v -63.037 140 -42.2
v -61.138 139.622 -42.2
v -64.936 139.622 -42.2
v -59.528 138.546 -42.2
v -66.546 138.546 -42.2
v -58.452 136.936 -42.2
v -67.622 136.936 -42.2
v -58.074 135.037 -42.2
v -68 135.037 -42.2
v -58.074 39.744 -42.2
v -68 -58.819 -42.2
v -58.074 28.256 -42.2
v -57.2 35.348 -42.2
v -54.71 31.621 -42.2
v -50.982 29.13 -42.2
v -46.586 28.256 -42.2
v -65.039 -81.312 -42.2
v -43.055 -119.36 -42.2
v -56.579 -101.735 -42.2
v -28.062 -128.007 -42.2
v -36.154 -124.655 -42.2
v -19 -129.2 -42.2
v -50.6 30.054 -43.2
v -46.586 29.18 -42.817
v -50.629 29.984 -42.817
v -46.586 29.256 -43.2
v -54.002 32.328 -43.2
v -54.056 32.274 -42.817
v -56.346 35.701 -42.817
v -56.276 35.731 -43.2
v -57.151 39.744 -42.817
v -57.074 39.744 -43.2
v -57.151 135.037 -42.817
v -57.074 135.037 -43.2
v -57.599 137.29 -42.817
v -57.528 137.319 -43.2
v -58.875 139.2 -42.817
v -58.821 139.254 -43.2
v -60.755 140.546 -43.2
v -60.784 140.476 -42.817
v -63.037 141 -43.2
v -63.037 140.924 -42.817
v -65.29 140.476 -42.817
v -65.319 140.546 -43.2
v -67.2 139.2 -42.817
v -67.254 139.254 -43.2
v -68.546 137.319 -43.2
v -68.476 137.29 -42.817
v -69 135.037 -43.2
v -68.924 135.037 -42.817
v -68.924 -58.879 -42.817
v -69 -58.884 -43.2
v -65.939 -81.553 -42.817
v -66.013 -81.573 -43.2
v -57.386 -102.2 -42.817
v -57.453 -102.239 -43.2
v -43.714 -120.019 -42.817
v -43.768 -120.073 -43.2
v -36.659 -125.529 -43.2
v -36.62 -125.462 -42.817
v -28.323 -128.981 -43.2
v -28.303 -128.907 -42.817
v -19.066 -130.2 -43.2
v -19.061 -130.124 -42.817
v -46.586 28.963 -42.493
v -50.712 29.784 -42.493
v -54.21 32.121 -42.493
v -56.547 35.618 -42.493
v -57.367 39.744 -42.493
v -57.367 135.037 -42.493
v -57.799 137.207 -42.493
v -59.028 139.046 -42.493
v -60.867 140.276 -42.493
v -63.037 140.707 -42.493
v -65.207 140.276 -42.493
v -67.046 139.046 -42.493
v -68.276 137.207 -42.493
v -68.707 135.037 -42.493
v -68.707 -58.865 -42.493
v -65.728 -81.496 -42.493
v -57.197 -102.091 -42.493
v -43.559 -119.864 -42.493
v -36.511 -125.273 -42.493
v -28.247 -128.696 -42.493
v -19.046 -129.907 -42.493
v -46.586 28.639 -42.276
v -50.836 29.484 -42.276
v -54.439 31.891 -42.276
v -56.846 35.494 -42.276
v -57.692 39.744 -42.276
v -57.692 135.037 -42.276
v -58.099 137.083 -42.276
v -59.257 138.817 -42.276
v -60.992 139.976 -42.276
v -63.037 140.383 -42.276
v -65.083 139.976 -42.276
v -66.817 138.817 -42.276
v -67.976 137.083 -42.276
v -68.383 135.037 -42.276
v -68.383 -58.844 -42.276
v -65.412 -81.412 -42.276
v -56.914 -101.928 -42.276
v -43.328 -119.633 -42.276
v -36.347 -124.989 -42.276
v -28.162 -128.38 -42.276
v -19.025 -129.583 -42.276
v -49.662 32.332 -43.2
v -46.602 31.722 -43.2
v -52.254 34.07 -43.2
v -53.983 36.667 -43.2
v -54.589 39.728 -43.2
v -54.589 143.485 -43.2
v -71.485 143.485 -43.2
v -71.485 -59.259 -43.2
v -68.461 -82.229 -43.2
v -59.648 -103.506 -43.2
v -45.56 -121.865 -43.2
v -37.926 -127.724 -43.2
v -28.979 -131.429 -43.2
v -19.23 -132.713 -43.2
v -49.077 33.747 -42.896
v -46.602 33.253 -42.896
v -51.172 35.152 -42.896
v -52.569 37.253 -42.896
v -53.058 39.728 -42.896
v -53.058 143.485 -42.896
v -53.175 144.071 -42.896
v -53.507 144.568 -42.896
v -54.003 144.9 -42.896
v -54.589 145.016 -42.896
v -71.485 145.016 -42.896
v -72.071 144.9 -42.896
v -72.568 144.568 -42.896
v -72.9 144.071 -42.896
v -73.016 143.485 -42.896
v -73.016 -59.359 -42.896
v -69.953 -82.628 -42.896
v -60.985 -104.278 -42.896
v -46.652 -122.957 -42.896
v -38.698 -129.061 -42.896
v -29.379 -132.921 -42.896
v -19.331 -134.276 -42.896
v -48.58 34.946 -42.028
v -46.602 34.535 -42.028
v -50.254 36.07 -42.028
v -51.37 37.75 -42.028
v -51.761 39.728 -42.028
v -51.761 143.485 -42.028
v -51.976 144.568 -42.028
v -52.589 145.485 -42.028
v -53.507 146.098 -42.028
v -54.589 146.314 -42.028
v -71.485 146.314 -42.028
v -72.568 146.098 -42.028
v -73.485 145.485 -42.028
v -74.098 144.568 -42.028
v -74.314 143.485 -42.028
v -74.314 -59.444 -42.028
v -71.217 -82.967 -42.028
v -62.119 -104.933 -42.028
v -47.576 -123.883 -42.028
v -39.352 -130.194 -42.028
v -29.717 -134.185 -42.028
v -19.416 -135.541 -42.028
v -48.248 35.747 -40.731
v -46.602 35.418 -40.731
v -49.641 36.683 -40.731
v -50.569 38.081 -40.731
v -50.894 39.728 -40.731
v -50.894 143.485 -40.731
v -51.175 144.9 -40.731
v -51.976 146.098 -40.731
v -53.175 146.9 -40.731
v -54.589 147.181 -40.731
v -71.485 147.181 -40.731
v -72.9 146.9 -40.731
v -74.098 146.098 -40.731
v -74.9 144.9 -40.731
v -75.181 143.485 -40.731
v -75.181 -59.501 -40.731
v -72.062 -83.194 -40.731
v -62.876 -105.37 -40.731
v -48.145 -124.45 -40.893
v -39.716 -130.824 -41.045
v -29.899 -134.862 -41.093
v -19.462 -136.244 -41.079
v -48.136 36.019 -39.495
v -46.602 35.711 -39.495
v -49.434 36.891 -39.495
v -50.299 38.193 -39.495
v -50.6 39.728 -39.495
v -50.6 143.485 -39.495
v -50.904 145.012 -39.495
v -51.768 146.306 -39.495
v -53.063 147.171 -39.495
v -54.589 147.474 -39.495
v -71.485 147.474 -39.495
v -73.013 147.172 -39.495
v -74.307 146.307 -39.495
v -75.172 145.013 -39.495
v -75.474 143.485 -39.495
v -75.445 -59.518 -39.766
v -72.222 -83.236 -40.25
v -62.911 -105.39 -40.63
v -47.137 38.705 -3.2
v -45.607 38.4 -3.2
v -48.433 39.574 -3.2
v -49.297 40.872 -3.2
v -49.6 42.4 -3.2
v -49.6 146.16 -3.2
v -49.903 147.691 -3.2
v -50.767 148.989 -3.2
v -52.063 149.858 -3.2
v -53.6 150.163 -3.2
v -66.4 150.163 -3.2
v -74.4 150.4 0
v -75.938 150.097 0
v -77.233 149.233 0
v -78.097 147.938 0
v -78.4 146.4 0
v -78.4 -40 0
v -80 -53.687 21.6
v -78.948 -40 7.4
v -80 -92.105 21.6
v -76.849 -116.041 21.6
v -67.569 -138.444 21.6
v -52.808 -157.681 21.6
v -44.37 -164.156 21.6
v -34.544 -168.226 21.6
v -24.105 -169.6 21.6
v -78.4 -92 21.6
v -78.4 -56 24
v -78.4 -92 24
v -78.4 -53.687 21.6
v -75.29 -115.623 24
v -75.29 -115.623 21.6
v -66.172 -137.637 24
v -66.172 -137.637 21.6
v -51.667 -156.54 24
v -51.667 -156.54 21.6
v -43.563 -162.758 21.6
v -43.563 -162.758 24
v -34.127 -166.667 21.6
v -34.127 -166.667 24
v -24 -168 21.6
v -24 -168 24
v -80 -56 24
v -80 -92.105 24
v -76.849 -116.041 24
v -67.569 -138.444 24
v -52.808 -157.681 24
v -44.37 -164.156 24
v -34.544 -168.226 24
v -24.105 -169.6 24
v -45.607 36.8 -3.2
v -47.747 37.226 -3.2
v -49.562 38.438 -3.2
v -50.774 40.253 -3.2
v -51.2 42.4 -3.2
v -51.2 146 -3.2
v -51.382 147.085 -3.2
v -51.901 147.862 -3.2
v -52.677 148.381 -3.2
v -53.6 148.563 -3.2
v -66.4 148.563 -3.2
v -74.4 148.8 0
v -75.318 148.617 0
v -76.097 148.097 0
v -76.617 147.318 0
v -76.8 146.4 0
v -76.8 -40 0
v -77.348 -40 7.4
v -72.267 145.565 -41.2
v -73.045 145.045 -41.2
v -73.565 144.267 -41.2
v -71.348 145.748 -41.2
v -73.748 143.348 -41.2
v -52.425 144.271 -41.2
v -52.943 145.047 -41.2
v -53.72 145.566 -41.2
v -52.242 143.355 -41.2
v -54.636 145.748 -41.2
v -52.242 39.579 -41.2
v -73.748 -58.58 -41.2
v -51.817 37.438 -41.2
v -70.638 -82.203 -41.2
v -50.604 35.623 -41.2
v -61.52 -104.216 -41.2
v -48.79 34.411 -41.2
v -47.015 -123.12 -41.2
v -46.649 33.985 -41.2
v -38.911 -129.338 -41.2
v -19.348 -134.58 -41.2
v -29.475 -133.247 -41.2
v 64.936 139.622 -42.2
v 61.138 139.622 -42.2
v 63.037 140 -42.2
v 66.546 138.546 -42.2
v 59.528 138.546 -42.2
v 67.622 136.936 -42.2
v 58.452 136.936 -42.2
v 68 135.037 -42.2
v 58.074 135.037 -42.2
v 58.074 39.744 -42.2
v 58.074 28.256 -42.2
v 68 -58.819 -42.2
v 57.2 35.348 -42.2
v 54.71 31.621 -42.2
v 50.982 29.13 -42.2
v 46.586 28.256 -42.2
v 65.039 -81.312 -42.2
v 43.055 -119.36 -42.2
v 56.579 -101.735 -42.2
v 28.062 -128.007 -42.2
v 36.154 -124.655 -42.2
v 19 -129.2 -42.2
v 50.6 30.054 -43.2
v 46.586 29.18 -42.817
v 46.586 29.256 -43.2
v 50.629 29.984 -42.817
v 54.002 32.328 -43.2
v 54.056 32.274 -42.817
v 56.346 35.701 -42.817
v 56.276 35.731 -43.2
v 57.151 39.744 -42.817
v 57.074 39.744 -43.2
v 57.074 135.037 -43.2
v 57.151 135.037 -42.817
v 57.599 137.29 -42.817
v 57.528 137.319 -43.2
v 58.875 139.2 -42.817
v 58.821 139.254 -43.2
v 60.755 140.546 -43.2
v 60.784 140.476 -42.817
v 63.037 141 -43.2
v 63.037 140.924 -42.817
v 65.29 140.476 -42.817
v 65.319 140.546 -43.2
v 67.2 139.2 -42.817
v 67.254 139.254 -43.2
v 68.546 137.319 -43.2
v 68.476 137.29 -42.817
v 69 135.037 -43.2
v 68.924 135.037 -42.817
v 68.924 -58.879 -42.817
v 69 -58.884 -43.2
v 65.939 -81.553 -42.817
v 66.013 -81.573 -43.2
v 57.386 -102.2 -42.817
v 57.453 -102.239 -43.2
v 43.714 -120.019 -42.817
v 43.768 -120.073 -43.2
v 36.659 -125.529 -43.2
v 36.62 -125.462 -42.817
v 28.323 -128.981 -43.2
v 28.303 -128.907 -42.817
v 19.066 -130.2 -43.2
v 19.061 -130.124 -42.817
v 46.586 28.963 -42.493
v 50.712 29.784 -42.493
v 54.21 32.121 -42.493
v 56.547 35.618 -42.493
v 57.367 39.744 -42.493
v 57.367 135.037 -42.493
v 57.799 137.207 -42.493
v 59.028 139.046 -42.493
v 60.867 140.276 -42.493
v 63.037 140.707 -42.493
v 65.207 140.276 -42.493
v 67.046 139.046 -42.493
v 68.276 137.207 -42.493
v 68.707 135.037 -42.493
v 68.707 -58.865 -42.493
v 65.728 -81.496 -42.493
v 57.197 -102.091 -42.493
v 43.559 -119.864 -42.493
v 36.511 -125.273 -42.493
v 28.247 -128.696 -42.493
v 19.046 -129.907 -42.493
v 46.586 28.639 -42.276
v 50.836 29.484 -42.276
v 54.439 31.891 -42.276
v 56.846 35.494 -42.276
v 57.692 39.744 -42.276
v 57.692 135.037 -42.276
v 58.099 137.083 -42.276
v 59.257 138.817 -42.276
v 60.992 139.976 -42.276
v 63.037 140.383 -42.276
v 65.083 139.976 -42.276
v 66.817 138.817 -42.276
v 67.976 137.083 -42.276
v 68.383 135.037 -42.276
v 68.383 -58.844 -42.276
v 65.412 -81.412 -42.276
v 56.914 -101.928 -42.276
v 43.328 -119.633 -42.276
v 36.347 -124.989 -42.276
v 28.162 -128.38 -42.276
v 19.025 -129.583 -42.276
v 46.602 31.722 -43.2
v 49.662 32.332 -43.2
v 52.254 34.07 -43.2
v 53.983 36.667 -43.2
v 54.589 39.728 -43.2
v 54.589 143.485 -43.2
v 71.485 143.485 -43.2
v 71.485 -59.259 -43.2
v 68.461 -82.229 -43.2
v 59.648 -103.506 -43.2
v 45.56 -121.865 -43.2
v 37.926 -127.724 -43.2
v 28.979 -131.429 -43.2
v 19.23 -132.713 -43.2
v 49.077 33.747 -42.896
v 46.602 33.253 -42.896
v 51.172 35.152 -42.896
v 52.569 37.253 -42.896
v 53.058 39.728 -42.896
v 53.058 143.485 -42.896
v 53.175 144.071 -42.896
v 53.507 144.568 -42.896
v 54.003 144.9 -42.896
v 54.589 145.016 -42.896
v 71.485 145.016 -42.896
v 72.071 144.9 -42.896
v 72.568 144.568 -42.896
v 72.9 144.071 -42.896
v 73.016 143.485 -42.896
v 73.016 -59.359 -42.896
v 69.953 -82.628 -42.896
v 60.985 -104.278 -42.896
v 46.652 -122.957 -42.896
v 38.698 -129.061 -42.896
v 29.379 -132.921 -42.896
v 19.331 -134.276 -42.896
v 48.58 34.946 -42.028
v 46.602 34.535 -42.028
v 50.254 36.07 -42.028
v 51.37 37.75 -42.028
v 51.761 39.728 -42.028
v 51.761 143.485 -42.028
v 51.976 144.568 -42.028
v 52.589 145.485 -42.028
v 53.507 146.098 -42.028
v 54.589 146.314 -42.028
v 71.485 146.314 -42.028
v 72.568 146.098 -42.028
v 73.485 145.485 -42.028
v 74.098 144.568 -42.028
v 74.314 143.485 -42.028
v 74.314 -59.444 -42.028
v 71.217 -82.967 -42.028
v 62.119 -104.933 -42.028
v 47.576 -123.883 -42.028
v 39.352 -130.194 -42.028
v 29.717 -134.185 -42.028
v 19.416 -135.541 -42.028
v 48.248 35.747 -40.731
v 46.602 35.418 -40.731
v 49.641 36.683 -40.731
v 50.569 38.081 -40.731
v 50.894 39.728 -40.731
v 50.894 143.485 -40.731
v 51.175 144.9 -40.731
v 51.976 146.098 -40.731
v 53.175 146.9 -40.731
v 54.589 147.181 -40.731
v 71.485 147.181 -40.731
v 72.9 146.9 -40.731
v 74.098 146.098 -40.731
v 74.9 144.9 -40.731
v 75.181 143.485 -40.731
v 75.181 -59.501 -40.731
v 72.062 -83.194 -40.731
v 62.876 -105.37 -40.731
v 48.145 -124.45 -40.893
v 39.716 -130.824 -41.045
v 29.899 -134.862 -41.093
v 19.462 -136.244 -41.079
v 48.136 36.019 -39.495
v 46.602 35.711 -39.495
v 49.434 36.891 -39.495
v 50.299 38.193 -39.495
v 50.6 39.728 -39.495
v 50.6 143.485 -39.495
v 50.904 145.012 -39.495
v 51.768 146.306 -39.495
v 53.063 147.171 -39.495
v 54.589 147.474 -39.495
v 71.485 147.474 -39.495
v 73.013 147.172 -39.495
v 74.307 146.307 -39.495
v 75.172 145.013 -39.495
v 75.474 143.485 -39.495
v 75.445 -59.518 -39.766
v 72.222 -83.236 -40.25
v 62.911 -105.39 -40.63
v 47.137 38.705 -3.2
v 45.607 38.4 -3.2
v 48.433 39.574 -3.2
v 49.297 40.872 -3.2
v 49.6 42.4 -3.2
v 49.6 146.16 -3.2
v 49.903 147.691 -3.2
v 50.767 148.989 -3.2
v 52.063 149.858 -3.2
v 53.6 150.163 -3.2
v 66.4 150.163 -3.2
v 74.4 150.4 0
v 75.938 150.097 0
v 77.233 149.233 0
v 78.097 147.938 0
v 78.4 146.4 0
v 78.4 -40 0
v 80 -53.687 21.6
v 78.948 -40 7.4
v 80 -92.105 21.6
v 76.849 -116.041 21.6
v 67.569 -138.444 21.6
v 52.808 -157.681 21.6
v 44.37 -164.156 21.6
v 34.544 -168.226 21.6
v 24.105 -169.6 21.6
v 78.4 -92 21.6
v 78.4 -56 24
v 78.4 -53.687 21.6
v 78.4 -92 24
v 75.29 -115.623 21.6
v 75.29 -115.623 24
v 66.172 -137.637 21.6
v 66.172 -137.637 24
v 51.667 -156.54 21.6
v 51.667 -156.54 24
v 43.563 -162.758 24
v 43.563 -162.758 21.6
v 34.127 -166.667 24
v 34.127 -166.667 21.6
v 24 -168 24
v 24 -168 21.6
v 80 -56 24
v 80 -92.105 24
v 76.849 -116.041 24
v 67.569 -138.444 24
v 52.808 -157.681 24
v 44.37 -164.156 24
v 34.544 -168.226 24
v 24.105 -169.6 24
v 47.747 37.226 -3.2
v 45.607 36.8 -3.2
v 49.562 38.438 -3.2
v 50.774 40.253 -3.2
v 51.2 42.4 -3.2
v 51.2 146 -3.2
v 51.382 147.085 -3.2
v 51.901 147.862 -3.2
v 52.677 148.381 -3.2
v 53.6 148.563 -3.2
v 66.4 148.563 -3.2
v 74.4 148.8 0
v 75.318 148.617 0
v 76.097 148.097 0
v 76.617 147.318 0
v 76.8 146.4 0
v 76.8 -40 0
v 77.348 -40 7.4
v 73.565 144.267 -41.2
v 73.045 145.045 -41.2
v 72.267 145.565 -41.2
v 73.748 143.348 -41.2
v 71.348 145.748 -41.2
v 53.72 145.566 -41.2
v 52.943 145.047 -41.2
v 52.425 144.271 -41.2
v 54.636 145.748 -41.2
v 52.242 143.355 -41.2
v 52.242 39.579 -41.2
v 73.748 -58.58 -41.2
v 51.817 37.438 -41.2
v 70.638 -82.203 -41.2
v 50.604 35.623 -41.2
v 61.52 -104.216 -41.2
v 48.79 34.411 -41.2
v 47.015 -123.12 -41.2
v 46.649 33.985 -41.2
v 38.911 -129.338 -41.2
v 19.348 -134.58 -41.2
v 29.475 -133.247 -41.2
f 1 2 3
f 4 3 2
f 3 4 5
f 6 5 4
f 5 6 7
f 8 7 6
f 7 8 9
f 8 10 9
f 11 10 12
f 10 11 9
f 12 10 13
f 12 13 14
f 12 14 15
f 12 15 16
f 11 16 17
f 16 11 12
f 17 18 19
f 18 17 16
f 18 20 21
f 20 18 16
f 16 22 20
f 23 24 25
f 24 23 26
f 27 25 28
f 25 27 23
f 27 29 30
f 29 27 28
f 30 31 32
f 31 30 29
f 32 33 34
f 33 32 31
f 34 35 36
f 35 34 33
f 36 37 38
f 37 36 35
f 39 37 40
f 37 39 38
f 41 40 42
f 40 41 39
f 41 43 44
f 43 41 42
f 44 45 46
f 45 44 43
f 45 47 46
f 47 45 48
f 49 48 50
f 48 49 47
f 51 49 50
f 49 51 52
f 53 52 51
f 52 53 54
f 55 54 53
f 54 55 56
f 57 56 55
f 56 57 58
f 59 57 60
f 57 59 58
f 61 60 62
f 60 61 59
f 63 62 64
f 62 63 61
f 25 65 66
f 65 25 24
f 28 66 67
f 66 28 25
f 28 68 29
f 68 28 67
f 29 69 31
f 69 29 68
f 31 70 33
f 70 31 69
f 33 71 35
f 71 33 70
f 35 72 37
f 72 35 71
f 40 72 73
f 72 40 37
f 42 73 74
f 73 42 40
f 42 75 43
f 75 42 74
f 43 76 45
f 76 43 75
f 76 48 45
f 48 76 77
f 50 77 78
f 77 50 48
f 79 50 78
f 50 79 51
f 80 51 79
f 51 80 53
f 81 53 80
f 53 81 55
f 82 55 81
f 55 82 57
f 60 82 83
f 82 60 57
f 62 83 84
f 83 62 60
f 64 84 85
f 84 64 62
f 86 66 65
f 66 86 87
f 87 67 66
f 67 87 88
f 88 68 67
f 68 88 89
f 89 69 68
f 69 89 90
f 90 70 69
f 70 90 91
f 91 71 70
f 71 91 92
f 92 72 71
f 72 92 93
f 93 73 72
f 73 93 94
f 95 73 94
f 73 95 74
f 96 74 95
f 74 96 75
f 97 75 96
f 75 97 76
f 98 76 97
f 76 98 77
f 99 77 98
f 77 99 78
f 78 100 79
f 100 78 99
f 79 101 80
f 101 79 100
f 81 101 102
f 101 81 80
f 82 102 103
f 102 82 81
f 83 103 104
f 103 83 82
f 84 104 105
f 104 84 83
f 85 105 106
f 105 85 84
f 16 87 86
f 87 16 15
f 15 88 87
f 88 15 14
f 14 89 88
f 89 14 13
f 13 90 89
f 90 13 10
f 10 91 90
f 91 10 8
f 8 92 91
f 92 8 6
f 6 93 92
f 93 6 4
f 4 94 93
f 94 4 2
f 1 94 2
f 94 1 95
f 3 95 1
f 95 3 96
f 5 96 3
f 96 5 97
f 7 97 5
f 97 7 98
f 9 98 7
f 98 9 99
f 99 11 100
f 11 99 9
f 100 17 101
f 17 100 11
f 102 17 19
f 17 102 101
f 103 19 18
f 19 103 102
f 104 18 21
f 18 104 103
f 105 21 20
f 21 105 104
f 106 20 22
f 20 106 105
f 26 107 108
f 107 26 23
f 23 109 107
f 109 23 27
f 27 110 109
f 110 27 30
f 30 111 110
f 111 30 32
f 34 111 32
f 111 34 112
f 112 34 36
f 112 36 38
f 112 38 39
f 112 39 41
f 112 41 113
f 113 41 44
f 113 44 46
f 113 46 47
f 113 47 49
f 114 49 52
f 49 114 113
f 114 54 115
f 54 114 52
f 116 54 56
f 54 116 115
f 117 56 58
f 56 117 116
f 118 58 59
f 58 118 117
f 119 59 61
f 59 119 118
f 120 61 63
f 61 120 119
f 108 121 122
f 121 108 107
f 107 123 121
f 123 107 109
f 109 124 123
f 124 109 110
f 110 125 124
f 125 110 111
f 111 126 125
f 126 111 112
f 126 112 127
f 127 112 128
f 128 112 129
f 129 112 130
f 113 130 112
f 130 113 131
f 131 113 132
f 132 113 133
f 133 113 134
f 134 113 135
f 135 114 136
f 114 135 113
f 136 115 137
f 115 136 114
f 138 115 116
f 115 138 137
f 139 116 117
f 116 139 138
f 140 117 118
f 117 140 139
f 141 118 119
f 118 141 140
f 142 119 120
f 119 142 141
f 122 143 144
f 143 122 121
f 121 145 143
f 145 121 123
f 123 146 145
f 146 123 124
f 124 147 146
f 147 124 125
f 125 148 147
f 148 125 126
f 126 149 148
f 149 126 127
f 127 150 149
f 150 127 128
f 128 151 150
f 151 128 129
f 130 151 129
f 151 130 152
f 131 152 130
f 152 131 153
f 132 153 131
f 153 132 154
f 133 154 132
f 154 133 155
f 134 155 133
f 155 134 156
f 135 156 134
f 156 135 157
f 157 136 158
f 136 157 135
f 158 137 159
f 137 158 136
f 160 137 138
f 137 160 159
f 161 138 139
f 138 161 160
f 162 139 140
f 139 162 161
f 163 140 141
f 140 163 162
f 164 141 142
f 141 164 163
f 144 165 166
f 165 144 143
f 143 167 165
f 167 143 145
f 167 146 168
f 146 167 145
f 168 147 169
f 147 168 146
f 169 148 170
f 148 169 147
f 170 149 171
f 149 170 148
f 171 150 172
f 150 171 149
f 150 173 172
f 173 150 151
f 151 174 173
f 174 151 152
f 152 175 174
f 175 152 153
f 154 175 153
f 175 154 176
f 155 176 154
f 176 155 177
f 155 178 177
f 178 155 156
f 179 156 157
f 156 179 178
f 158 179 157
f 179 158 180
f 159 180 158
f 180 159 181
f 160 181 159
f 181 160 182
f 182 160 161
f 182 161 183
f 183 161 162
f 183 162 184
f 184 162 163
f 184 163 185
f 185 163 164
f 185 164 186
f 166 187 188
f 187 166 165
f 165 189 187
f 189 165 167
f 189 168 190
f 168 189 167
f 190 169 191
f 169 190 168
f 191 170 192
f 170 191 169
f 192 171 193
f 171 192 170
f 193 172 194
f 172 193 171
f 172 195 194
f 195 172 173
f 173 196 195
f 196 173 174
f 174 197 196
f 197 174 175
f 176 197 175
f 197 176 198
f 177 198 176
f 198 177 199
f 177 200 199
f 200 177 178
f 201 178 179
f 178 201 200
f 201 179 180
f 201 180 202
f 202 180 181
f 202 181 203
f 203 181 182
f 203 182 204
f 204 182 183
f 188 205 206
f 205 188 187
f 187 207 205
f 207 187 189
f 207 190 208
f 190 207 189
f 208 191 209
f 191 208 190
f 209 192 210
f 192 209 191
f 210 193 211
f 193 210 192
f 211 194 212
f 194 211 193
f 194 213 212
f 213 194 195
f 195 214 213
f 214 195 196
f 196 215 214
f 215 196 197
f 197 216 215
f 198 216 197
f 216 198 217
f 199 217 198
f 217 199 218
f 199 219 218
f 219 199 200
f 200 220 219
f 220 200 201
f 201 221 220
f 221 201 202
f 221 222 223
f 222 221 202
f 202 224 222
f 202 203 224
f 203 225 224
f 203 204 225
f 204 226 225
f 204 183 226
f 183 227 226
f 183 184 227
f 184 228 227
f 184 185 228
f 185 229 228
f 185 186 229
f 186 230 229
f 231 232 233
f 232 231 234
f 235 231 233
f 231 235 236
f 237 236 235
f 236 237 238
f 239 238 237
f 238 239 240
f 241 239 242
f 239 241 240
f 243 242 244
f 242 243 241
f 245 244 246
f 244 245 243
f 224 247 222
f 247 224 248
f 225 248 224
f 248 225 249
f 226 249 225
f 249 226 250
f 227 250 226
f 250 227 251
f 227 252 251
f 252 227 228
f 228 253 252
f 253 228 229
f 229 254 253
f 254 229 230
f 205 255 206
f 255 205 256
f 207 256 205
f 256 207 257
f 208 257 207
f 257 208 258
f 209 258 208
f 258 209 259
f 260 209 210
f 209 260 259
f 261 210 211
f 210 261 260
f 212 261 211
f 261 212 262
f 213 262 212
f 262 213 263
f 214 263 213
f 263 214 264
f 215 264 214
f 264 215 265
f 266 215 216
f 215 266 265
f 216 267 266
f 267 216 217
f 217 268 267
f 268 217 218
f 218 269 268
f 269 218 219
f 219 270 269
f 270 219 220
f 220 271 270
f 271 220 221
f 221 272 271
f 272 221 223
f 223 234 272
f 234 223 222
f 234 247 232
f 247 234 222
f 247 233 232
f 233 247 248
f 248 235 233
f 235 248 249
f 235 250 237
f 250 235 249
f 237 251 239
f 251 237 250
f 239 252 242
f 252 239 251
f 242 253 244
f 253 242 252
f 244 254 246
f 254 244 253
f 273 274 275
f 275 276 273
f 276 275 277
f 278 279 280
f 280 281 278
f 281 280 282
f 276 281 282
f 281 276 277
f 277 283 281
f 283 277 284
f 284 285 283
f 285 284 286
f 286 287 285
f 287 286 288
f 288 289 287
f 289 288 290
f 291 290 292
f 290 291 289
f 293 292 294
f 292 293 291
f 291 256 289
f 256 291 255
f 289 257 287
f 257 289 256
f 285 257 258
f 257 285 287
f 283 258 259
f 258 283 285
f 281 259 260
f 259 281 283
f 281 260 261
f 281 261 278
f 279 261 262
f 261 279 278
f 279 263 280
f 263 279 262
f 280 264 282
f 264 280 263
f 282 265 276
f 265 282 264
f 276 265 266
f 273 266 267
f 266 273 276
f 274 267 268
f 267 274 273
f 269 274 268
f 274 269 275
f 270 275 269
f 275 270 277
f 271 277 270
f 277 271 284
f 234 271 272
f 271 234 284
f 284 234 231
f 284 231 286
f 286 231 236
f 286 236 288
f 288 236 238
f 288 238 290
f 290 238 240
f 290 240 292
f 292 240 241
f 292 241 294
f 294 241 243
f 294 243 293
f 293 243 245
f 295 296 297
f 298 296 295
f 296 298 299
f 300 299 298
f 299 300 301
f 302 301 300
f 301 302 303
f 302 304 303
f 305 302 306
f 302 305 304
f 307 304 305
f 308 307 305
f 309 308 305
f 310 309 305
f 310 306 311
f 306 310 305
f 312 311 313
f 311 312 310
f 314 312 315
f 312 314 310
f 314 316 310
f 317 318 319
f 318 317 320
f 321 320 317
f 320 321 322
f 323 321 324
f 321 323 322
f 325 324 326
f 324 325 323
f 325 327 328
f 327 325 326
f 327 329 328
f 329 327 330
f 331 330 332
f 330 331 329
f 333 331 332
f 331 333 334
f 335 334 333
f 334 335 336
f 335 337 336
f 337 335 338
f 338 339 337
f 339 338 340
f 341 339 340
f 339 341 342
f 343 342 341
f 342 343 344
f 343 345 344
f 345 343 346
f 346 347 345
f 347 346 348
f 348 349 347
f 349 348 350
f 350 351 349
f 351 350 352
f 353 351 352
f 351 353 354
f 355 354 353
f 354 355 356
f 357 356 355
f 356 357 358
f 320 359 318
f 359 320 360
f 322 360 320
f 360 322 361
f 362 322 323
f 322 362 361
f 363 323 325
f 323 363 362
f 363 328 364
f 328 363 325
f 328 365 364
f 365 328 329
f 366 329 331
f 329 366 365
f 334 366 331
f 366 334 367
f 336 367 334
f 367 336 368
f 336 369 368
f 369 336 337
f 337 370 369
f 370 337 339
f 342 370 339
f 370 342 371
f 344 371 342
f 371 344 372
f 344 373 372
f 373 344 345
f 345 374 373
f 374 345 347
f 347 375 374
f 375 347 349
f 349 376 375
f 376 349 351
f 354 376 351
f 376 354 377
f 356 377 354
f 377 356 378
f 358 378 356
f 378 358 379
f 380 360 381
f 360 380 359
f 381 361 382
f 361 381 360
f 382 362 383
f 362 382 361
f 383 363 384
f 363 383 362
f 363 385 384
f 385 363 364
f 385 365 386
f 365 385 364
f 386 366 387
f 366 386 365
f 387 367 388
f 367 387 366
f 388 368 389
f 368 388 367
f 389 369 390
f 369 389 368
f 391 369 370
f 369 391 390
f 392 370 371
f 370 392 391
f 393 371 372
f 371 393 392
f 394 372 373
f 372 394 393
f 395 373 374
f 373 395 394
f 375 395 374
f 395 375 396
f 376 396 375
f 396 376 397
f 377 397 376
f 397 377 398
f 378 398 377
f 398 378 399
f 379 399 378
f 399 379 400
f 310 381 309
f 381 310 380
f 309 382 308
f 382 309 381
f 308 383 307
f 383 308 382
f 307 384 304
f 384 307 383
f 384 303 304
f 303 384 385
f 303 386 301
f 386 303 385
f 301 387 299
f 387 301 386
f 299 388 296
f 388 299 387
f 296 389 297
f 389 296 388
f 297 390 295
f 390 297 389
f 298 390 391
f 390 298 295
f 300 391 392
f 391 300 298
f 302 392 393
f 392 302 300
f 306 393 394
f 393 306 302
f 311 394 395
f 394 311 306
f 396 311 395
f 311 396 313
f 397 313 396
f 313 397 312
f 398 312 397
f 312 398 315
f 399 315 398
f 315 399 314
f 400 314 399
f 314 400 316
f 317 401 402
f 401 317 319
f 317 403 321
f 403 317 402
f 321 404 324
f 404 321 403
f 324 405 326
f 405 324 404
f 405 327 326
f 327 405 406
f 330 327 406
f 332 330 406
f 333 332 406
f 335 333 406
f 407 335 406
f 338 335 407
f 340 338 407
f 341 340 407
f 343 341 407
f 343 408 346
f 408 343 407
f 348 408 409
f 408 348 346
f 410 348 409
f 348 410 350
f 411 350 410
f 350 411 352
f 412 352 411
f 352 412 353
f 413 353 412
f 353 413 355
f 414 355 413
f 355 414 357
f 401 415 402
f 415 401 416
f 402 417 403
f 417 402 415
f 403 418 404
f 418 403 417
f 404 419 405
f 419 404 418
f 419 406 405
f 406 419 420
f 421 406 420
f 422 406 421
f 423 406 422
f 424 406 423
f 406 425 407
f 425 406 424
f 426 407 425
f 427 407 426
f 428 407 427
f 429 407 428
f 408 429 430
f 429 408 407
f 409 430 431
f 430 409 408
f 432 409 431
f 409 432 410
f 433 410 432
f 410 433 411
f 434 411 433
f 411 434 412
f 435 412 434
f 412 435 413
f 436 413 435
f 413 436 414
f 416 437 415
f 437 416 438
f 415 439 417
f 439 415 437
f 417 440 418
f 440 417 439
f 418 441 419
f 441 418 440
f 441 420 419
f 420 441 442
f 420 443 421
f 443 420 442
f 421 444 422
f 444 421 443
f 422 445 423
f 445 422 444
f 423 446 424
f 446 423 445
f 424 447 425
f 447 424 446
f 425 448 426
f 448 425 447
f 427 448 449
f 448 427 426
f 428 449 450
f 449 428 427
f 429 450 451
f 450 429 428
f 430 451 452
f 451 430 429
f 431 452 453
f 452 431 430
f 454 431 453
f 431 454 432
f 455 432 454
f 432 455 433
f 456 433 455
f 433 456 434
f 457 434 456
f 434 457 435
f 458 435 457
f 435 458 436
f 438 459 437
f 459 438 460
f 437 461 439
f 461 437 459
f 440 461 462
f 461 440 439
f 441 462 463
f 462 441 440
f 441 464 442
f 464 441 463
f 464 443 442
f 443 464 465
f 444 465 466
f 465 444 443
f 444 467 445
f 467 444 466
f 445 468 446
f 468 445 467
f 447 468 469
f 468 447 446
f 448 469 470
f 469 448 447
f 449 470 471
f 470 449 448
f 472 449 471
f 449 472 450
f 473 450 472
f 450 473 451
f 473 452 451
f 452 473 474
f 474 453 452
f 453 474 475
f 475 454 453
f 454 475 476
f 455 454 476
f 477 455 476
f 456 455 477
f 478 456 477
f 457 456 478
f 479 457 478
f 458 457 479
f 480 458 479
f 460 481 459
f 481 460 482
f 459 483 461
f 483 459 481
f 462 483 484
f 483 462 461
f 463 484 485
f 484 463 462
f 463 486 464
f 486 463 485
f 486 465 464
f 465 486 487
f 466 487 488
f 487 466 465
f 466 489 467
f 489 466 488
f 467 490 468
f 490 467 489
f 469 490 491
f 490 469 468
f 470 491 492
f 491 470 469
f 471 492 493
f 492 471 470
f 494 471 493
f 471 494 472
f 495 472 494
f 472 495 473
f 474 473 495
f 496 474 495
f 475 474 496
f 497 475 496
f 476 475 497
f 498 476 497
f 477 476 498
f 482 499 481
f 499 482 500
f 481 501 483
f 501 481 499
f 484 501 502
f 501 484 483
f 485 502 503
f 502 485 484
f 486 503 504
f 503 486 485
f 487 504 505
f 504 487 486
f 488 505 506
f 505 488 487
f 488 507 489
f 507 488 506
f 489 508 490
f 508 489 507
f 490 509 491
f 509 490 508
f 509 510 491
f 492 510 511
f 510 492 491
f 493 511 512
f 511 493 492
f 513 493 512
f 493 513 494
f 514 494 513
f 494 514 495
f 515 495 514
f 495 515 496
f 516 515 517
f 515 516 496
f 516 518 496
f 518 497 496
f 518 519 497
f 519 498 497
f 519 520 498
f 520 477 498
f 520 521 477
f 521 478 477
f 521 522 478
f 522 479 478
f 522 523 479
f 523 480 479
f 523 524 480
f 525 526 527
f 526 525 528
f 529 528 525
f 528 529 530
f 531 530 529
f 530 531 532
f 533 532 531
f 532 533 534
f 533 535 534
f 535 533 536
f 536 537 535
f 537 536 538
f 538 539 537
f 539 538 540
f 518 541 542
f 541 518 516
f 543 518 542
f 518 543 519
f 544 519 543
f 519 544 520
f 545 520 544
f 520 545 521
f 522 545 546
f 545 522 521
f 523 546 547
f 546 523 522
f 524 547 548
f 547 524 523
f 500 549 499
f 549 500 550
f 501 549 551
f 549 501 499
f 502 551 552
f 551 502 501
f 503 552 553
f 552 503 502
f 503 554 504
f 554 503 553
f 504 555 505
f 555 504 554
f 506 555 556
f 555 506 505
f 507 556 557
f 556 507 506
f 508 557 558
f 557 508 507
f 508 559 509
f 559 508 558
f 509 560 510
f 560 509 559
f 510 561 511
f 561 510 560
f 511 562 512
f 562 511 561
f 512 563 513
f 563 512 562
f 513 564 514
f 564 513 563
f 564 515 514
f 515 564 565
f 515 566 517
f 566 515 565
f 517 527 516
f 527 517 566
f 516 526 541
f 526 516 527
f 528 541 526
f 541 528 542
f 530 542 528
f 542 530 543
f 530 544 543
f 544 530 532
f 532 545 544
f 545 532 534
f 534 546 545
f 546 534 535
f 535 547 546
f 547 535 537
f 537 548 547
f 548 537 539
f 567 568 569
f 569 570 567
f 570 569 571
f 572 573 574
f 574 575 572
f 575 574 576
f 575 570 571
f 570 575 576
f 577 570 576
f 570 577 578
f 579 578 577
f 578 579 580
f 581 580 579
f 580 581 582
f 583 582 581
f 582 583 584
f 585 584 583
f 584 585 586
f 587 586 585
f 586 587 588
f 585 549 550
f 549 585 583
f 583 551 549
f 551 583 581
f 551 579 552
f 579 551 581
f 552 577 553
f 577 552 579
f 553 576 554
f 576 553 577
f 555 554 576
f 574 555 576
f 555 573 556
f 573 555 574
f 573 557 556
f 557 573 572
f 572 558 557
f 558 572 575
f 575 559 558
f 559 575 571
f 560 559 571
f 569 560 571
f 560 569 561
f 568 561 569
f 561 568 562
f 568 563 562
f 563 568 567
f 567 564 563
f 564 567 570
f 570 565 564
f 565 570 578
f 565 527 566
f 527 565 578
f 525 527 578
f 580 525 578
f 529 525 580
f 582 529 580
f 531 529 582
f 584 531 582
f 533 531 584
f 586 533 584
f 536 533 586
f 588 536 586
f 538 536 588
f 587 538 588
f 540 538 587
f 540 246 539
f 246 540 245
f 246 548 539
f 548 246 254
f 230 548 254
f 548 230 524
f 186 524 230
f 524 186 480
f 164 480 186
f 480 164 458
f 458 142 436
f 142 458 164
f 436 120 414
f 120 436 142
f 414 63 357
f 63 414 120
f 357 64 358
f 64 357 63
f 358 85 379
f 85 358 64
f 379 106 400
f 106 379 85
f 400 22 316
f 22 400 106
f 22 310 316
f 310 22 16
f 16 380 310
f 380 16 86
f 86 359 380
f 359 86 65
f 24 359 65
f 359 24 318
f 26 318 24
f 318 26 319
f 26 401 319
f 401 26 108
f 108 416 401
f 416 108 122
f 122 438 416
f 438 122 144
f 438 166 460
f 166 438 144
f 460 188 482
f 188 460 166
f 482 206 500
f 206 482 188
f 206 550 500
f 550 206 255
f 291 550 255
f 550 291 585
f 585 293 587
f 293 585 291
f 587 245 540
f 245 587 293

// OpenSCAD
use <../lib.scad>
use <s/18913s01.scad>
function ldraw_lib__18913() = [
// 0 Boat Hull Floating 40 x 20 Bottom (Needs Work)
// 0 Name: 18913.dat
// 0 Author: Massimo Maso [Sirio]
// 0 !LDRAW_ORG Part UPDATE 2020-01
// 0 !LICENSE Licensed under CC BY 4.0 : see CAreadme.txt
// 
// 0 BFC CERTIFY CCW
  [0,"BFC","CERTIFY"],
  [0,"BFC","CCW"],
// 
// 0 !HISTORY 2016-03-18 {LEGO Digital Designer} Original part shape
// 0 !HISTORY 2019-07-18 [Sirio] File preparation for LDraw Parts Tracker
// 0 !HISTORY 2020-06-28 [PTadmin] Official Update 2020-01
// 
// 
// 0 // Needs Work: usually invisible inside not modeled
// 
// 0 // Subparts
// 1 16 0 0 0 1 0 0 0 1 0 0 0 1 s\18913s01.dat
  [1,16,0,0,0,1,0,0,0,1,0,0,0,1, ldraw_lib__s__18913s01()],
// 1 16 0 0 0 -1 0 0 0 1 0 0 0 1 s\18913s01.dat
  [1,16,0,0,0,-1,0,0,0,1,0,0,0,1, ldraw_lib__s__18913s01()],
// 0 // Outside
// 4 16 -60 -54 -420 -60 -60 -420 60 -60 -420 60 -54 -420
  [4,16,-60,-54,-420,-60,-60,-420,60,-60,-420,60,-54,-420],
// 4 16 -60 -60 -420 -60.2622 -60 -424 60.2622 -60 -424 60 -60 -420
  [4,16,-60,-60,-420,-60.2622,-60,-424,60.2622,-60,-424,60,-60,-420],
// 4 16 -60.2622 -60 -424 -60.2622 -54 -424 60.2622 -54 -424 60.2622 -60 -424
  [4,16,-60.2622,-60,-424,-60.2622,-54,-424,60.2622,-54,-424,60.2622,-60,-424],
// 4 16 -60.2622 -54 -424 -48.6549 102.6979 -340.6101 48.6549 102.6979 -340.6101 60.2622 -54 -424
  [4,16,-60.2622,-54,-424,-48.6549,102.6979,-340.6101,48.6549,102.6979,-340.6101,60.2622,-54,-424],
// 4 16 -48.6549 102.6979 -340.6101 -48.5391 105.0711 -338.8534 48.5391 105.0711 -338.8534 48.6549 102.6979 -340.6101
  [4,16,-48.6549,102.6979,-340.6101,-48.5391,105.0711,-338.8534,48.5391,105.0711,-338.8534,48.6549,102.6979,-340.6101],
// 4 16 -48.5391 105.0711 -338.8534 -48.3265 107.2388 -335.6902 48.3265 107.2388 -335.6902 48.5391 105.0711 -338.8534
  [4,16,-48.5391,105.0711,-338.8534,-48.3265,107.2388,-335.6902,48.3265,107.2388,-335.6902,48.5391,105.0711,-338.8534],
// 4 16 -48.3265 107.2388 -335.6902 -48.0756 108 -331.7823 48.0756 108 -331.7823 48.3265 107.2388 -335.6902
  [4,16,-48.3265,107.2388,-335.6902,-48.0756,108,-331.7823,48.0756,108,-331.7823,48.3265,107.2388,-335.6902],
// 4 16 -48.0756 108 -331.7823 -47.6639 108 -325.5 47.6639 108 -325.5 48.0756 108 -331.7823
  [4,16,-48.0756,108,-331.7823,-47.6639,108,-325.5,47.6639,108,-325.5,48.0756,108,-331.7823],
// 4 16 -47.6639 108 -325.5 -47.6514 107.0433 -325.3097 47.6514 107.0433 -325.3097 47.6639 108 -325.5
  [4,16,-47.6639,108,-325.5,-47.6514,107.0433,-325.3097,47.6514,107.0433,-325.3097,47.6639,108,-325.5],
// 4 16 -47.6514 107.0433 -325.3097 -47.6159 106.2322 -324.7678 47.6159 106.2322 -324.7678 47.6514 107.0433 -325.3097
  [4,16,-47.6514,107.0433,-325.3097,-47.6159,106.2322,-324.7678,47.6159,106.2322,-324.7678,47.6514,107.0433,-325.3097],
// 4 16 -47.6159 106.2322 -324.7678 -47.5627 105.6903 -323.9567 47.5627 105.6903 -323.9567 47.6159 106.2322 -324.7678
  [4,16,-47.6159,106.2322,-324.7678,-47.5627,105.6903,-323.9567,47.5627,105.6903,-323.9567,47.6159,106.2322,-324.7678],
// 4 16 -47.5627 105.6903 -323.9567 -47.5 105.5 -323 47.5 105.5 -323 47.5627 105.6903 -323.9567
  [4,16,-47.5627,105.6903,-323.9567,-47.5,105.5,-323,47.5,105.5,-323,47.5627,105.6903,-323.9567],
// 4 16 -47.5 105.5 -323 -116.4652 105.5 70.6399 116.4652 105.5 70.6399 47.5 105.5 -323
  [4,16,-47.5,105.5,-323,-116.4652,105.5,70.6399,116.4652,105.5,70.6399,47.5,105.5,-323],
// 4 16 -116.4652 105.5 70.6399 -116.4652 105.6903 71.5966 116.4652 105.6903 71.5966 116.4652 105.5 70.6399
  [4,16,-116.4652,105.5,70.6399,-116.4652,105.6903,71.5966,116.4652,105.6903,71.5966,116.4652,105.5,70.6399],
// 4 16 -116.4652 105.6903 71.5966 -116.4652 106.2322 72.4076 116.4652 106.2322 72.4076 116.4652 105.6903 71.5966
  [4,16,-116.4652,105.6903,71.5966,-116.4652,106.2322,72.4076,116.4652,106.2322,72.4076,116.4652,105.6903,71.5966],
// 4 16 -116.4652 106.2322 72.4076 -116.4652 107.0433 72.9496 116.4652 107.0433 72.9496 116.4652 106.2322 72.4076
  [4,16,-116.4652,106.2322,72.4076,-116.4652,107.0433,72.9496,116.4652,107.0433,72.9496,116.4652,106.2322,72.4076],
// 4 16 -116.4652 107.0433 72.9496 -116.4652 108 73.1399 116.4652 108 73.1399 116.4652 107.0433 72.9496
  [4,16,-116.4652,107.0433,72.9496,-116.4652,108,73.1399,116.4652,108,73.1399,116.4652,107.0433,72.9496],
// 4 16 -116.4652 108 73.1399 -116.5058 108 79.3059 116.5058 108 79.3059 116.4652 108 73.1399
  [4,16,-116.4652,108,73.1399,-116.5058,108,79.3059,116.5058,108,79.3059,116.4652,108,73.1399],
// 4 16 -116.5058 108 79.3059 -116.5058 107.2388 83.1328 116.5058 107.2388 83.1328 116.5058 108 79.3059
  [4,16,-116.5058,108,79.3059,-116.5058,107.2388,83.1328,116.5058,107.2388,83.1328,116.5058,108,79.3059],
// 4 16 -116.5058 107.2388 83.1328 -116.5058 105.0711 86.337 116.5058 105.0711 86.337 116.5058 107.2388 83.1328
  [4,16,-116.5058,107.2388,83.1328,-116.5058,105.0711,86.337,116.5058,105.0711,86.337,116.5058,107.2388,83.1328],
// 4 16 -116.5058 105.0711 86.337 -116.5058 101.8268 88.5447 116.5058 101.8268 88.5447 116.5058 105.0711 86.337
  [4,16,-116.5058,105.0711,86.337,-116.5058,101.8268,88.5447,116.5058,101.8268,88.5447,116.5058,105.0711,86.337],
// 4 16 -116.5058 101.8268 88.5447 -116.5058 98.7387 89.2786 116.5058 98.7387 89.2786 116.5058 101.8268 88.5447
  [4,16,-116.5058,101.8268,88.5447,-116.5058,98.7387,89.2786,116.5058,98.7387,89.2786,116.5058,101.8268,88.5447],
// 4 16 -116.5058 98.7387 89.2786 -114.0165 8 96 114.0165 8 96 116.5058 98.7387 89.2786
  [4,16,-116.5058,98.7387,89.2786,-114.0165,8,96,114.0165,8,96,116.5058,98.7387,89.2786],
// 4 16 -114.0165 8 96 -114.0165 8 92 114.0165 8 92 114.0165 8 96
  [4,16,-114.0165,8,96,-114.0165,8,92,114.0165,8,92,114.0165,8,96],
// 0 // Edges
// 2 24 -114.0165 8 96 114.0165 8 96
  [2,24,-114.0165,8,96,114.0165,8,96],
// 2 24 -114.0165 8 92 114.0165 8 92
  [2,24,-114.0165,8,92,114.0165,8,92],
// 2 24 -116.4652 108 73.1399 116.4652 108 73.1399
  [2,24,-116.4652,108,73.1399,116.4652,108,73.1399],
// 2 24 -47.6639 108 -325.5 47.6639 108 -325.5
  [2,24,-47.6639,108,-325.5,47.6639,108,-325.5],
// 2 24 -60 -54 -420 60 -54 -420
  [2,24,-60,-54,-420,60,-54,-420],
// 2 24 -60 -60 -420 60 -60 -420
  [2,24,-60,-60,-420,60,-60,-420],
// 2 24 -60.2622 -60 -424 60.2622 -60 -424
  [2,24,-60.2622,-60,-424,60.2622,-60,-424],
// 2 24 -60.2622 -54 -424 60.2622 -54 -424
  [2,24,-60.2622,-54,-424,60.2622,-54,-424],
// 0 // Conditional lines
// 5 24 -48.6549 102.6979 -340.6101 48.6549 102.6979 -340.6101 -48.5391 105.071 -338.853 60.2622 -54 -424
  [5,24,-48.6549,102.6979,-340.6101,48.6549,102.6979,-340.6101,-48.5391,105.071,-338.853,60.2622,-54,-424],
// 5 24 -48.5391 105.0711 -338.8534 48.5391 105.0711 -338.8534 -48.3265 107.2388 -335.6902 48.6549 102.6979 -340.61
  [5,24,-48.5391,105.0711,-338.8534,48.5391,105.0711,-338.8534,-48.3265,107.2388,-335.6902,48.6549,102.6979,-340.61],
// 5 24 -48.3265 107.2388 -335.6902 48.3265 107.2388 -335.6902 -48.0756 108 -331.782 48.5391 105.0711 -338.8534
  [5,24,-48.3265,107.2388,-335.6902,48.3265,107.2388,-335.6902,-48.0756,108,-331.782,48.5391,105.0711,-338.8534],
// 5 24 -48.0756 108 -331.7823 48.0756 108 -331.7823 -47.6632 108 -325.489 48.3265 107.2388 -335.6902
  [5,24,-48.0756,108,-331.7823,48.0756,108,-331.7823,-47.6632,108,-325.489,48.3265,107.2388,-335.6902],
// 5 24 -47.6514 107.0433 -325.3097 47.6514 107.0433 -325.3097 -47.6159 106.2322 -324.7678 47.6639 108 -325.5
  [5,24,-47.6514,107.0433,-325.3097,47.6514,107.0433,-325.3097,-47.6159,106.2322,-324.7678,47.6639,108,-325.5],
// 5 24 -47.6159 106.2322 -324.7678 47.6159 106.2322 -324.7678 -47.5624 105.69 -323.953 47.6514 107.0433 -325.3097
  [5,24,-47.6159,106.2322,-324.7678,47.6159,106.2322,-324.7678,-47.5624,105.69,-323.953,47.6514,107.0433,-325.3097],
// 5 24 -47.5627 105.6903 -323.9567 47.5627 105.6903 -323.9567 -47.5 105.5 -323 47.6159 106.2322 -324.7678
  [5,24,-47.5627,105.6903,-323.9567,47.5627,105.6903,-323.9567,-47.5,105.5,-323,47.6159,106.2322,-324.7678],
// 5 24 -47.5 105.5 -323 47.5 105.5 -323 -116.4652 105.5 70.6399 47.5627 105.6903 -323.9567
  [5,24,-47.5,105.5,-323,47.5,105.5,-323,-116.4652,105.5,70.6399,47.5627,105.6903,-323.9567],
// 5 24 -116.4652 105.5 70.6399 116.4652 105.5 70.6399 47.5 105.5 -323 -116.4652 105.6903 71.5966
  [5,24,-116.4652,105.5,70.6399,116.4652,105.5,70.6399,47.5,105.5,-323,-116.4652,105.6903,71.5966],
// 5 24 -116.4652 105.6903 71.5966 116.4652 105.6903 71.5966 116.4652 105.5 70.6399 -116.4652 106.2322 72.4076
  [5,24,-116.4652,105.6903,71.5966,116.4652,105.6903,71.5966,116.4652,105.5,70.6399,-116.4652,106.2322,72.4076],
// 5 24 -116.4652 106.2322 72.4076 116.4652 106.2322 72.4076 -116.4652 107.0433 72.9496 116.4652 105.69 71.5966
  [5,24,-116.4652,106.2322,72.4076,116.4652,106.2322,72.4076,-116.4652,107.0433,72.9496,116.4652,105.69,71.5966],
// 5 24 -116.4652 107.0433 72.9496 116.4652 107.0433 72.9496 -116.4652 108 73.1399 116.4652 106.232 72.4076
  [5,24,-116.4652,107.0433,72.9496,116.4652,107.0433,72.9496,-116.4652,108,73.1399,116.4652,106.232,72.4076],
// 5 24 -116.5058 108 79.3059 116.5058 108 79.3059 -116.5058 107.2388 83.1328 116.4652 108 73.1399
  [5,24,-116.5058,108,79.3059,116.5058,108,79.3059,-116.5058,107.2388,83.1328,116.4652,108,73.1399],
// 5 24 -116.5058 107.2388 83.1328 116.5058 107.2388 83.1328 -116.5058 105.0711 86.337 116.5058 108 79.3059
  [5,24,-116.5058,107.2388,83.1328,116.5058,107.2388,83.1328,-116.5058,105.0711,86.337,116.5058,108,79.3059],
// 5 24 -116.5058 105.0711 86.337 116.5058 105.0711 86.337 -116.5058 98.7387 89.2786 116.5058 107.2388 83.1328
  [5,24,-116.5058,105.0711,86.337,116.5058,105.0711,86.337,-116.5058,98.7387,89.2786,116.5058,107.2388,83.1328],
// 5 24 -116.5058 101.8268 88.5447 116.5058 101.8268 88.5447 -116.5058 98.7387 89.2786 116.5058 105.0711 86.337
  [5,24,-116.5058,101.8268,88.5447,116.5058,101.8268,88.5447,-116.5058,98.7387,89.2786,116.5058,105.0711,86.337],
// 5 24 -116.5058 98.7387 89.2786 116.5058 98.7387 89.2786 -114.0165 8 96 116.5058 105.071 86.377
  [5,24,-116.5058,98.7387,89.2786,116.5058,98.7387,89.2786,-114.0165,8,96,116.5058,105.071,86.377],
// 0 // Invisible inside
// 4 16 -114.0165 8 92 -116.6227 103 84.963 116.6227 103 84.963 114.0165 8 92
  [4,16,-114.0165,8,92,-116.6227,103,84.963,116.6227,103,84.963,114.0165,8,92],
// 4 16 -116.6227 103 84.963 -48.3704 103 -336.4494 48.3704 103 -336.4494 116.6227 103 84.963
  [4,16,-116.6227,103,84.963,-48.3704,103,-336.4494,48.3704,103,-336.4494,116.6227,103,84.963],
// 4 16 -48.3704 103 -336.4494 -60 -54 -420 60 -54 -420 48.3704 103 -336.4494
  [4,16,-48.3704,103,-336.4494,-60,-54,-420,60,-54,-420,48.3704,103,-336.4494],
// 0 // Edges
// 2 24 -116.6227 103 84.963 116.6227 103 84.963
  [2,24,-116.6227,103,84.963,116.6227,103,84.963],
// 2 24 -48.3704 103 -336.4494 48.3704 103 -336.4494
  [2,24,-48.3704,103,-336.4494,48.3704,103,-336.4494],
];
module ldraw_lib__18913(step=0, col=false, unit=2/5, alt=false, line=0.2, solid=!$preview)
    makepoly(ldraw_lib__18913(), step=step, col=col, unit=unit, alt=alt, line=line, solid=solid);
ldraw_lib__18913(line=0.2);
